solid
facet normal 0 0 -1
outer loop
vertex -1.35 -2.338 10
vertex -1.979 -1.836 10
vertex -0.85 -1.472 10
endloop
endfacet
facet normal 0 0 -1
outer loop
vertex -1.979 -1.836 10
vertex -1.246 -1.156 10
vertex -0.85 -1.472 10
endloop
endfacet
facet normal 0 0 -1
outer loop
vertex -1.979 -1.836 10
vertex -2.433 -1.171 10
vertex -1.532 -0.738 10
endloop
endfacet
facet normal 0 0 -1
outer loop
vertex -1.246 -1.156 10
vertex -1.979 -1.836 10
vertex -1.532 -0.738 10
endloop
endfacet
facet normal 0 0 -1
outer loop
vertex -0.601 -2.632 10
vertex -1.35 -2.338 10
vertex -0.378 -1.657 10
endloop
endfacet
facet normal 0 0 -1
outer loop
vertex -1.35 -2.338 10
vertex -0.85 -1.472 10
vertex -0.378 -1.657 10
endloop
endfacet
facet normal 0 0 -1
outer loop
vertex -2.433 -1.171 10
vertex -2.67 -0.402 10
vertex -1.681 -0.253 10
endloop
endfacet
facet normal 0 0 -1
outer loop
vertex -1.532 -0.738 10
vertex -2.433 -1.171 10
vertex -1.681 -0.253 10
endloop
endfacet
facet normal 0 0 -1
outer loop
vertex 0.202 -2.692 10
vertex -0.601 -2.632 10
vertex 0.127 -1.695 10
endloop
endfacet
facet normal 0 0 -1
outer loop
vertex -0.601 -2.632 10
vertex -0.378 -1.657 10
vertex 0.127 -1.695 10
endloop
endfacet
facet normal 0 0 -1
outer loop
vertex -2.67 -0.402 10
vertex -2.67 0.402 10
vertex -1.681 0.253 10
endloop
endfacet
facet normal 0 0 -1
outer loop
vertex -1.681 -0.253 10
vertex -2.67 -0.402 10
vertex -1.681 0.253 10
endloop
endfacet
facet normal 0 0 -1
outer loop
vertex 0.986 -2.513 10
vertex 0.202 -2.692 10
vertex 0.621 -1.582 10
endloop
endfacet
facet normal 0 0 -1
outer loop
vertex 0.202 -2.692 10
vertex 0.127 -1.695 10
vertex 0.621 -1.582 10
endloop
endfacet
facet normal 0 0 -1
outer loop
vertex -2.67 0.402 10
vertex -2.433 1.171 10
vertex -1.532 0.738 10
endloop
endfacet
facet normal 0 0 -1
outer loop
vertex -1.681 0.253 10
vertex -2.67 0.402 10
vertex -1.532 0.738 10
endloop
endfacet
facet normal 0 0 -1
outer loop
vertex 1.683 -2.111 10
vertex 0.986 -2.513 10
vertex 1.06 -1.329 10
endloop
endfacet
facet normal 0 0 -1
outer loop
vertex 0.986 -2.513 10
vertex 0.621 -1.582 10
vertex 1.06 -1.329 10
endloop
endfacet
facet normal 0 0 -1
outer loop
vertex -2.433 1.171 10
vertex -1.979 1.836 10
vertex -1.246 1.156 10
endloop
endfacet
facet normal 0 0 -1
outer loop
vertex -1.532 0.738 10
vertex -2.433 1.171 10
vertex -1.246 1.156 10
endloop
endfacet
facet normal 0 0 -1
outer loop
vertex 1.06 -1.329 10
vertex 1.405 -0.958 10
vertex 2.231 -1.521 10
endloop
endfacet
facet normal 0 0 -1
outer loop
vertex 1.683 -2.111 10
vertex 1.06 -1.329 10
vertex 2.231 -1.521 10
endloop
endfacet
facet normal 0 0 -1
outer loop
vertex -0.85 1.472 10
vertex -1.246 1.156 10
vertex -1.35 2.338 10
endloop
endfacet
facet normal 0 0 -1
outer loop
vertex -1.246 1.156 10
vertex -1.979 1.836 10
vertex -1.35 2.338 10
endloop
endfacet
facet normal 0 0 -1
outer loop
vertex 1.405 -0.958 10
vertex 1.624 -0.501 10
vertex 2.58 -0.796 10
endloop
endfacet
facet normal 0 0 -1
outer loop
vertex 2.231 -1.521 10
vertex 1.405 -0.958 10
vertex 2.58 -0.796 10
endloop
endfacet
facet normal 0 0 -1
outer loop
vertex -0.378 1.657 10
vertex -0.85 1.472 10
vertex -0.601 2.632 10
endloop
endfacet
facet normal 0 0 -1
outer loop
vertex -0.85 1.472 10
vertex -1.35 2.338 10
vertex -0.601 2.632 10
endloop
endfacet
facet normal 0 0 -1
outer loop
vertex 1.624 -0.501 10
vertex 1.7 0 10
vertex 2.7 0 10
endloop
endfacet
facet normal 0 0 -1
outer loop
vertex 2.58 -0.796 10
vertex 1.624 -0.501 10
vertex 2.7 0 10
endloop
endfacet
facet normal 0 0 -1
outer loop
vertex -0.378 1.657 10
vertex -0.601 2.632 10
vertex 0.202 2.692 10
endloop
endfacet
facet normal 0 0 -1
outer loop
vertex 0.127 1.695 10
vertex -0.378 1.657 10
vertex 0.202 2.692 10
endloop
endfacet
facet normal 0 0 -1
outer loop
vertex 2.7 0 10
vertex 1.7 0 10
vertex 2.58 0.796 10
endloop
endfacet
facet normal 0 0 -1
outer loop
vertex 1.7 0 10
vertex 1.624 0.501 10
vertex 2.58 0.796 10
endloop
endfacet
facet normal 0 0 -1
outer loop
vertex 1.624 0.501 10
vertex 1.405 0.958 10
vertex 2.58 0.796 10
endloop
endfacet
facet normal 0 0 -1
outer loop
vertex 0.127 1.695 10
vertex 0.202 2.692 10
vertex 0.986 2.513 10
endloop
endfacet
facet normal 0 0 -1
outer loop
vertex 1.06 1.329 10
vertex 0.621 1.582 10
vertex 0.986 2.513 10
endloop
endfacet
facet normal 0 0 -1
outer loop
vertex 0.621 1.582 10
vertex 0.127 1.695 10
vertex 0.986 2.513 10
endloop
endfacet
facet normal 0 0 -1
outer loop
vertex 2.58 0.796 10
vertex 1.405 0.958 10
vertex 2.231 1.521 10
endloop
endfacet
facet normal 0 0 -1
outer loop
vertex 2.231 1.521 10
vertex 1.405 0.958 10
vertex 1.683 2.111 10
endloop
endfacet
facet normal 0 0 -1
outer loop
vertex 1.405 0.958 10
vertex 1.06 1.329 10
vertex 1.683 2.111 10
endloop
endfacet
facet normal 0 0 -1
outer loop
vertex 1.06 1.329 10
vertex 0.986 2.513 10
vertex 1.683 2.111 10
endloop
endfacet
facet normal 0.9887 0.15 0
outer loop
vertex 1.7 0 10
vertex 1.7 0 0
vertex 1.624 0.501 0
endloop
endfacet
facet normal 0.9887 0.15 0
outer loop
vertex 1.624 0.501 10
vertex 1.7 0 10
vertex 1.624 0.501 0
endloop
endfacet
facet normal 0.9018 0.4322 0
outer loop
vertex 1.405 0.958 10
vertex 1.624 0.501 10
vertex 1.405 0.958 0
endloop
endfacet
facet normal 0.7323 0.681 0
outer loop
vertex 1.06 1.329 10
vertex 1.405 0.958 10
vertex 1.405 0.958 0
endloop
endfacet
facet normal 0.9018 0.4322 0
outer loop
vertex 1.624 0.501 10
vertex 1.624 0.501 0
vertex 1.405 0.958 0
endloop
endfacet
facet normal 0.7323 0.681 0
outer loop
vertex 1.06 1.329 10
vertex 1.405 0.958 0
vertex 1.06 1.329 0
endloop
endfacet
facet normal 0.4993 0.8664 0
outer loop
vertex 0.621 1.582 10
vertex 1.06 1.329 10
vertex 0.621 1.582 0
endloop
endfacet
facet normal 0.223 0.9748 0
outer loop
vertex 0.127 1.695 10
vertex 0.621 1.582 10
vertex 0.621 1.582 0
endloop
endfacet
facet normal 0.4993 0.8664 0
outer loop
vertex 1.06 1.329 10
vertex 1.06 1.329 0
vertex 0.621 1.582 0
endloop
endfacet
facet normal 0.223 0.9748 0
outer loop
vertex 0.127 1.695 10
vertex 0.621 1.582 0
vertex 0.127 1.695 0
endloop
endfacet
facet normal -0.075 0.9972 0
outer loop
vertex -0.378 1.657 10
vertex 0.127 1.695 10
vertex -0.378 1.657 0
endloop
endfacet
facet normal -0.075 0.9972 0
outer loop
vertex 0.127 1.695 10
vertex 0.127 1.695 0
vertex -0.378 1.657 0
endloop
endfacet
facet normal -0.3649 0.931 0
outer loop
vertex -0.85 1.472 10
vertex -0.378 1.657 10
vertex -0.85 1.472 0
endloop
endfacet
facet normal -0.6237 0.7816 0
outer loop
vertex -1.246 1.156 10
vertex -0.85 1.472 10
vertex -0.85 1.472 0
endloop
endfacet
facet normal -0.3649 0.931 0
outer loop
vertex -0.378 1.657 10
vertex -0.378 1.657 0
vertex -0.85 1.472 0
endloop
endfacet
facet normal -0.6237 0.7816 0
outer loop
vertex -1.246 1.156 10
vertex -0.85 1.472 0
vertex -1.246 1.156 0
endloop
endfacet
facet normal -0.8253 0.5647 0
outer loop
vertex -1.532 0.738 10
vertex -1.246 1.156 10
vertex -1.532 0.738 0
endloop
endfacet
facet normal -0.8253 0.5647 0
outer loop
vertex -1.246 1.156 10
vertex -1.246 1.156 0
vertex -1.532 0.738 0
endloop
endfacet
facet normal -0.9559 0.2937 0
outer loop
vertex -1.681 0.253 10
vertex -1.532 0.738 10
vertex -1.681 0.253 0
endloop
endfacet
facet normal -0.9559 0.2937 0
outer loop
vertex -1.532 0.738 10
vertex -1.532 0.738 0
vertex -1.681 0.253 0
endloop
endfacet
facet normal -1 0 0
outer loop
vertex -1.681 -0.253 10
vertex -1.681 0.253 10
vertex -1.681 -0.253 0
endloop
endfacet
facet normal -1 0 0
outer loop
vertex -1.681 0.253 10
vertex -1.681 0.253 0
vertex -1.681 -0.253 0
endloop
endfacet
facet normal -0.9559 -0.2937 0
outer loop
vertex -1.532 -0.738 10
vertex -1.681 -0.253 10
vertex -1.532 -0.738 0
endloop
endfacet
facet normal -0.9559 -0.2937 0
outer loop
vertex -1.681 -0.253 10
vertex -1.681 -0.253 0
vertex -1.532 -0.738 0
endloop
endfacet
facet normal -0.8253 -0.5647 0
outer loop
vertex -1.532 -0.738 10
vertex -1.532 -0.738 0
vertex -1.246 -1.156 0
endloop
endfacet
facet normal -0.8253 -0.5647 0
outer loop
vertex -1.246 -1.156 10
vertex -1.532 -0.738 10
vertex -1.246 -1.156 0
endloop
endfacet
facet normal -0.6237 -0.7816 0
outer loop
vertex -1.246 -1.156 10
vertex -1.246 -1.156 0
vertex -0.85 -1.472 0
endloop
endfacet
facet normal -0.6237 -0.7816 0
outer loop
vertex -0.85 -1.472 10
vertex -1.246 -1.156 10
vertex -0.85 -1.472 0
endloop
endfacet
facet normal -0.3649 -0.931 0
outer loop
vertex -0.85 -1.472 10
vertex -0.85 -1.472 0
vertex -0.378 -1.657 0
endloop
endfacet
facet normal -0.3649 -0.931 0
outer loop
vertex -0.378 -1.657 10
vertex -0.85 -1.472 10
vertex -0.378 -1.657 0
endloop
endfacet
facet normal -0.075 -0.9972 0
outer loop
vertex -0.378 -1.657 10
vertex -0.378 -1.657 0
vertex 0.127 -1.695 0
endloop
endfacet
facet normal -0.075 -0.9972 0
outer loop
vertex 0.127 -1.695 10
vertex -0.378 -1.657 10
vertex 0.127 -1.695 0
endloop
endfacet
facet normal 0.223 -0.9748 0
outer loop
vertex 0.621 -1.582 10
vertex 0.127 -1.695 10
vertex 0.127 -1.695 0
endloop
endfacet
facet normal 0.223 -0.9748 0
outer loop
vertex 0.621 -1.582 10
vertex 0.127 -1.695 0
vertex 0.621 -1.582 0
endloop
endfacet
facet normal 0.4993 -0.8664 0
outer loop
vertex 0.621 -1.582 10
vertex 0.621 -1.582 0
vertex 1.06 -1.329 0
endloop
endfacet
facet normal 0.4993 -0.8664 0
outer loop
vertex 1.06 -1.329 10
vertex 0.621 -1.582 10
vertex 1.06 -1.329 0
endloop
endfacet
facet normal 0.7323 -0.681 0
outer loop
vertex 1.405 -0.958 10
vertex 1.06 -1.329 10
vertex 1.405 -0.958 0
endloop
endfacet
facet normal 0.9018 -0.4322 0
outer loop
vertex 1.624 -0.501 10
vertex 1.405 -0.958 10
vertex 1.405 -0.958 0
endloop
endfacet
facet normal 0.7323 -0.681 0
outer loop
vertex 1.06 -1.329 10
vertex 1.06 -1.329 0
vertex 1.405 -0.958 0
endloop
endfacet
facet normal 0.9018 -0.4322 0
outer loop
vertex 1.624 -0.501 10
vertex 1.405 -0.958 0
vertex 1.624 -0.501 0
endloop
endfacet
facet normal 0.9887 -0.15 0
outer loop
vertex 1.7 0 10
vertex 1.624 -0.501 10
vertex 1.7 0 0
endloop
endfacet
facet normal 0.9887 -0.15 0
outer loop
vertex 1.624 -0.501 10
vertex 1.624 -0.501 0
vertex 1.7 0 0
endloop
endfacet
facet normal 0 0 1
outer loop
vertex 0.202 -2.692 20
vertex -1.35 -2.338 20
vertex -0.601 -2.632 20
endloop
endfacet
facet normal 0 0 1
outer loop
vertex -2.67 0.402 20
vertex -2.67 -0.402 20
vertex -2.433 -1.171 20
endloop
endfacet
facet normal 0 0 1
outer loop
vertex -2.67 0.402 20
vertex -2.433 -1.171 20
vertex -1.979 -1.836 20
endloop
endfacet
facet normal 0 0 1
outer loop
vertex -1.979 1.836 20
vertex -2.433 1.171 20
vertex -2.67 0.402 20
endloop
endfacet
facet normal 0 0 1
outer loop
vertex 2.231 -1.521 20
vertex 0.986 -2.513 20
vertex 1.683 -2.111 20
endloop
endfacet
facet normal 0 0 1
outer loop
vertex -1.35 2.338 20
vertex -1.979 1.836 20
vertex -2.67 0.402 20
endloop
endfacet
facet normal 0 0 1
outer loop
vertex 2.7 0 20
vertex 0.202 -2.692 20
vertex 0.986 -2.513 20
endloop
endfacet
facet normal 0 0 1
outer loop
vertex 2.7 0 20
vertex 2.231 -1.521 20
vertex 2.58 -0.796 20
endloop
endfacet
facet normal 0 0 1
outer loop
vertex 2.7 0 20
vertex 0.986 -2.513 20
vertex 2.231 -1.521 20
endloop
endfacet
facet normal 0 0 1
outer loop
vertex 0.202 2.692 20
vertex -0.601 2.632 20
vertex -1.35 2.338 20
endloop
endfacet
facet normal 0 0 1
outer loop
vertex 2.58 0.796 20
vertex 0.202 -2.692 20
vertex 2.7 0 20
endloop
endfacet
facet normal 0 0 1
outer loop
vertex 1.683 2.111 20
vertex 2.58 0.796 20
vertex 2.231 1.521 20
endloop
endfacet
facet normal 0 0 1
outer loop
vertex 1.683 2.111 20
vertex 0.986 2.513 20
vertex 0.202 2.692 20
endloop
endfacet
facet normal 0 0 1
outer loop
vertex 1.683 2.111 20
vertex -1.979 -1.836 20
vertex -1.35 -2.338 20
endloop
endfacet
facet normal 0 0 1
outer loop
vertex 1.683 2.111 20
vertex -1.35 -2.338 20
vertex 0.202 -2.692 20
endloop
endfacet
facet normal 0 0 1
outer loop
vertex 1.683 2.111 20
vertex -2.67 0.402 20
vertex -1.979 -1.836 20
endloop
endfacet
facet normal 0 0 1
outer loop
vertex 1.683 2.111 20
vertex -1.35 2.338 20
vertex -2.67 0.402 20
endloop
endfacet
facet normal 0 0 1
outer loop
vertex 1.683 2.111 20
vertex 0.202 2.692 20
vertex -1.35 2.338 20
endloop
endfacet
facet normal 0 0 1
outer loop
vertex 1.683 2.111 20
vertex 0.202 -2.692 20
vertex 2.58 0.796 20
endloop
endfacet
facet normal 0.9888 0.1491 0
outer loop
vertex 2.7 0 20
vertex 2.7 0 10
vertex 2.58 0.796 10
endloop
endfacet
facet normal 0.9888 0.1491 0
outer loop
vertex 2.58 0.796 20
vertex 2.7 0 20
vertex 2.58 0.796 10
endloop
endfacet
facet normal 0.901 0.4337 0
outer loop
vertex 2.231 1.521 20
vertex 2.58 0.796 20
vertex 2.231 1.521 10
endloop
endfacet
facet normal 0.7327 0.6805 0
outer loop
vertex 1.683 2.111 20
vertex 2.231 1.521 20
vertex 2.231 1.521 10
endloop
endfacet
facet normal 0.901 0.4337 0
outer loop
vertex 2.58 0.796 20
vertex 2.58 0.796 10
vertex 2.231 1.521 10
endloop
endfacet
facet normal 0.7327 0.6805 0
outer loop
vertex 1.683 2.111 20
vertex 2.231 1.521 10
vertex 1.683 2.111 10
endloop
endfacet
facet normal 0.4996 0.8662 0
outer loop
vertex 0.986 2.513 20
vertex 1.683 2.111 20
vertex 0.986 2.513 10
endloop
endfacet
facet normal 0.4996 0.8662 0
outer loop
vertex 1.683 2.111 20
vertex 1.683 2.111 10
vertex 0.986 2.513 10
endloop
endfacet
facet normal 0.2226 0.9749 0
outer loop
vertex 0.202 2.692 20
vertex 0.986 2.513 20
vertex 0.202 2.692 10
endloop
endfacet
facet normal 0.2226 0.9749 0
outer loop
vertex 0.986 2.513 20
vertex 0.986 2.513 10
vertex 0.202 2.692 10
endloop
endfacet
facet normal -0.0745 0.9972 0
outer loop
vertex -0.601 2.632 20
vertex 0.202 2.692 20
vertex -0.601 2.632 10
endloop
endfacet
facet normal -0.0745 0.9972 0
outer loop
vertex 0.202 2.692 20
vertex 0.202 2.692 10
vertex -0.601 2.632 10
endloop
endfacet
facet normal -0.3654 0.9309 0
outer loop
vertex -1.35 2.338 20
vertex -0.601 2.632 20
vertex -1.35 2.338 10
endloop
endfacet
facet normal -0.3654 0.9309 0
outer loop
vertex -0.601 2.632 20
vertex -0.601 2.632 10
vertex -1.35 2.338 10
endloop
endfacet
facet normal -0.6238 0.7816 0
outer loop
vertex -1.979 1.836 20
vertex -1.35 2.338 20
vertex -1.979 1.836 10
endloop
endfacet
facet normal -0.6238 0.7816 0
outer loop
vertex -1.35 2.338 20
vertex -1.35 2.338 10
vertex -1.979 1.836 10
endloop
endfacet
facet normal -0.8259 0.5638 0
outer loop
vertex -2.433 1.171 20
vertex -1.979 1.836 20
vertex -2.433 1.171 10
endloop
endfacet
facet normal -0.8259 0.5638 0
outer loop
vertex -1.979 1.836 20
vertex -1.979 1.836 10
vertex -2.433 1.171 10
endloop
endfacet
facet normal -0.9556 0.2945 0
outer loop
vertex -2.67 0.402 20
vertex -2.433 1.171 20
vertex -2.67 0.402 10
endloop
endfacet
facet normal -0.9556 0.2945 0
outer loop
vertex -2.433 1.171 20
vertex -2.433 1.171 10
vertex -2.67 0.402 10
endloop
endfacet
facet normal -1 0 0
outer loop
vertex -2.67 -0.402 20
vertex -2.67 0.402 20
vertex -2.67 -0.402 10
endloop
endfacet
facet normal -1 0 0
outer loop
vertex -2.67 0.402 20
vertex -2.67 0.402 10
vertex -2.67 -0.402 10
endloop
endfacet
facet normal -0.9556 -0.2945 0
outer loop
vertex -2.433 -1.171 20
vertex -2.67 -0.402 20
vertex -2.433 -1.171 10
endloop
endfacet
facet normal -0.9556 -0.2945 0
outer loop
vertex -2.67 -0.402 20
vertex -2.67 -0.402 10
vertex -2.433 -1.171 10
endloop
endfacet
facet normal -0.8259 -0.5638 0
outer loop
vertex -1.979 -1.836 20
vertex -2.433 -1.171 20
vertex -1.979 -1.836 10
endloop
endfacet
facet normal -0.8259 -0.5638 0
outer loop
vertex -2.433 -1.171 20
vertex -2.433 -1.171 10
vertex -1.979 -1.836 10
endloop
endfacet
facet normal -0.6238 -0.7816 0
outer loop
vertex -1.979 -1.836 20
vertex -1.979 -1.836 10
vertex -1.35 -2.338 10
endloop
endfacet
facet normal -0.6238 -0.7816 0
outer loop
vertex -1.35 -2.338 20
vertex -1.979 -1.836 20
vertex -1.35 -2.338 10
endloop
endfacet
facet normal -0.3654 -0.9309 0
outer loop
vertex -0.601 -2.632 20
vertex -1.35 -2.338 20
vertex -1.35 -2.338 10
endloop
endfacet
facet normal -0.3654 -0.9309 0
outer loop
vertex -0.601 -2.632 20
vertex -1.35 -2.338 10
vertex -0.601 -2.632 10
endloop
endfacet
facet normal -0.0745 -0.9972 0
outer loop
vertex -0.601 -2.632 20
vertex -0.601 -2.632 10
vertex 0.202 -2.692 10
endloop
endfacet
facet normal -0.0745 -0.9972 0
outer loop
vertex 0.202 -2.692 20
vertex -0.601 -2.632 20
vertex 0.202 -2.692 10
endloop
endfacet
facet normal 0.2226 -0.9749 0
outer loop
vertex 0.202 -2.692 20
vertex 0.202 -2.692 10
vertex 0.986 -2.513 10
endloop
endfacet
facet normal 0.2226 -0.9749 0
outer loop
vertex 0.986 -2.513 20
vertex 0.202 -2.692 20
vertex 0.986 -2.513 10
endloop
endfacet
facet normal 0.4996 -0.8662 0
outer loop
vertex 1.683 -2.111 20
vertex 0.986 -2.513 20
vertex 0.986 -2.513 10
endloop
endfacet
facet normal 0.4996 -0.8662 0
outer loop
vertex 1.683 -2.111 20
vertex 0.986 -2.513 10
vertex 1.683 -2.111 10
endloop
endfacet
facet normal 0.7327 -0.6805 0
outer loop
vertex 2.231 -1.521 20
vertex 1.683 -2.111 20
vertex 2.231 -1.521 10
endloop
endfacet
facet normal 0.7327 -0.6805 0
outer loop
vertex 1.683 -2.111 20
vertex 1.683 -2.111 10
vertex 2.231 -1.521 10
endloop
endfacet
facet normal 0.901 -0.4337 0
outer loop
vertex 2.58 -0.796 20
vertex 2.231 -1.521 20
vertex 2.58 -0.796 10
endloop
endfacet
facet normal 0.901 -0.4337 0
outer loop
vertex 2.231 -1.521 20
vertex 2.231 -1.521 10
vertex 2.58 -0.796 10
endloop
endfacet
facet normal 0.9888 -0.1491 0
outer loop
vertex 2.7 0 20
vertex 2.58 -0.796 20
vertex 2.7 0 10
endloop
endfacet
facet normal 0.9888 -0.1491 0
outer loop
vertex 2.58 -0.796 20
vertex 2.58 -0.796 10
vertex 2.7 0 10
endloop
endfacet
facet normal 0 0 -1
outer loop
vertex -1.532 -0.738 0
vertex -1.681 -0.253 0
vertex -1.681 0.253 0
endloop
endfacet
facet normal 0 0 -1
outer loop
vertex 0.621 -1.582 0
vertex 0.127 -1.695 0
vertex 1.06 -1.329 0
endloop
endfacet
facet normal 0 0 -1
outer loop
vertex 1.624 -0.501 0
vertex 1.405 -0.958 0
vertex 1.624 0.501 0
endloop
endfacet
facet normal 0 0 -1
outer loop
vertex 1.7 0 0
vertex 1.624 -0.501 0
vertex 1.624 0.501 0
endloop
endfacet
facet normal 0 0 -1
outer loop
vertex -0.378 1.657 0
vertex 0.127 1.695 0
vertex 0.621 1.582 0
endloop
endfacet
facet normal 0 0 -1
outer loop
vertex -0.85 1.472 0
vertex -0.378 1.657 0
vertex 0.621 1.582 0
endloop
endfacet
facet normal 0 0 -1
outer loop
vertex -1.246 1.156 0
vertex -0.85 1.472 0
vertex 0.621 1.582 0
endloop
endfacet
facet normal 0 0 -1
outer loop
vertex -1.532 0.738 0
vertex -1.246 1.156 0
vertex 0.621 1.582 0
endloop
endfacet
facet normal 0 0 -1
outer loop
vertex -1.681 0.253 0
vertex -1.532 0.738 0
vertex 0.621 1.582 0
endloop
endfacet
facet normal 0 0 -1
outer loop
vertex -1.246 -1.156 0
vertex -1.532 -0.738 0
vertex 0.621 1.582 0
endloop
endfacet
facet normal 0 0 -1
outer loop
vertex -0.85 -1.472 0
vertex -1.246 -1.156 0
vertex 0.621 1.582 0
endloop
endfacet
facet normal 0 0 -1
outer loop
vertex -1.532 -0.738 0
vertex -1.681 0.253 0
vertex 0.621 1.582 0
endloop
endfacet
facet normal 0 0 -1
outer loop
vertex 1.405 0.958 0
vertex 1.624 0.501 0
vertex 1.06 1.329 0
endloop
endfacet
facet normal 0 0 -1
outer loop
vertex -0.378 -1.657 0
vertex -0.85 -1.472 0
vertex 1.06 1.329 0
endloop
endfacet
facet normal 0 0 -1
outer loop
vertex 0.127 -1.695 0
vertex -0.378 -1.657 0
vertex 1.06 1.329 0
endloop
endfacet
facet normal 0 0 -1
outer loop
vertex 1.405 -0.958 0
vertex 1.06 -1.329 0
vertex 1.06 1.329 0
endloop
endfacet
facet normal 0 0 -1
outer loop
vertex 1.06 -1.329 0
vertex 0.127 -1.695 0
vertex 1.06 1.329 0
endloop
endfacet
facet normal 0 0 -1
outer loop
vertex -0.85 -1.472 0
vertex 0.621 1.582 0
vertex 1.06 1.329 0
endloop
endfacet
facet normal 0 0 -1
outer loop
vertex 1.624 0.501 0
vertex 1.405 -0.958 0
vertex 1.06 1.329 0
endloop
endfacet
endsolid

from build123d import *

# Parameters (mm, degrees)
CYLINDER1020_R     = 2.7
CYLINDER1020_DEPTH = 10
CYLINDER1018_R     = 1.7
CYLINDER1018_DEPTH = 10


with BuildPart() as cylinder1015:
    # Cylinder1020 → Cylinder1020 (new body)
    with BuildSketch(Plane.XY.offset(10)):
        Circle(CYLINDER1020_R)
    extrude(amount=CYLINDER1020_DEPTH)


with BuildPart() as m3bolthead:
    # Cylinder1018 → Cylinder1018 (new body)
    with BuildSketch(Plane.XY):
        Circle(CYLINDER1018_R)
    extrude(amount=CYLINDER1018_DEPTH)

    # Fusion024: union Cylinder1015
    add(cylinder1015.part)


solid = m3bolthead.part
